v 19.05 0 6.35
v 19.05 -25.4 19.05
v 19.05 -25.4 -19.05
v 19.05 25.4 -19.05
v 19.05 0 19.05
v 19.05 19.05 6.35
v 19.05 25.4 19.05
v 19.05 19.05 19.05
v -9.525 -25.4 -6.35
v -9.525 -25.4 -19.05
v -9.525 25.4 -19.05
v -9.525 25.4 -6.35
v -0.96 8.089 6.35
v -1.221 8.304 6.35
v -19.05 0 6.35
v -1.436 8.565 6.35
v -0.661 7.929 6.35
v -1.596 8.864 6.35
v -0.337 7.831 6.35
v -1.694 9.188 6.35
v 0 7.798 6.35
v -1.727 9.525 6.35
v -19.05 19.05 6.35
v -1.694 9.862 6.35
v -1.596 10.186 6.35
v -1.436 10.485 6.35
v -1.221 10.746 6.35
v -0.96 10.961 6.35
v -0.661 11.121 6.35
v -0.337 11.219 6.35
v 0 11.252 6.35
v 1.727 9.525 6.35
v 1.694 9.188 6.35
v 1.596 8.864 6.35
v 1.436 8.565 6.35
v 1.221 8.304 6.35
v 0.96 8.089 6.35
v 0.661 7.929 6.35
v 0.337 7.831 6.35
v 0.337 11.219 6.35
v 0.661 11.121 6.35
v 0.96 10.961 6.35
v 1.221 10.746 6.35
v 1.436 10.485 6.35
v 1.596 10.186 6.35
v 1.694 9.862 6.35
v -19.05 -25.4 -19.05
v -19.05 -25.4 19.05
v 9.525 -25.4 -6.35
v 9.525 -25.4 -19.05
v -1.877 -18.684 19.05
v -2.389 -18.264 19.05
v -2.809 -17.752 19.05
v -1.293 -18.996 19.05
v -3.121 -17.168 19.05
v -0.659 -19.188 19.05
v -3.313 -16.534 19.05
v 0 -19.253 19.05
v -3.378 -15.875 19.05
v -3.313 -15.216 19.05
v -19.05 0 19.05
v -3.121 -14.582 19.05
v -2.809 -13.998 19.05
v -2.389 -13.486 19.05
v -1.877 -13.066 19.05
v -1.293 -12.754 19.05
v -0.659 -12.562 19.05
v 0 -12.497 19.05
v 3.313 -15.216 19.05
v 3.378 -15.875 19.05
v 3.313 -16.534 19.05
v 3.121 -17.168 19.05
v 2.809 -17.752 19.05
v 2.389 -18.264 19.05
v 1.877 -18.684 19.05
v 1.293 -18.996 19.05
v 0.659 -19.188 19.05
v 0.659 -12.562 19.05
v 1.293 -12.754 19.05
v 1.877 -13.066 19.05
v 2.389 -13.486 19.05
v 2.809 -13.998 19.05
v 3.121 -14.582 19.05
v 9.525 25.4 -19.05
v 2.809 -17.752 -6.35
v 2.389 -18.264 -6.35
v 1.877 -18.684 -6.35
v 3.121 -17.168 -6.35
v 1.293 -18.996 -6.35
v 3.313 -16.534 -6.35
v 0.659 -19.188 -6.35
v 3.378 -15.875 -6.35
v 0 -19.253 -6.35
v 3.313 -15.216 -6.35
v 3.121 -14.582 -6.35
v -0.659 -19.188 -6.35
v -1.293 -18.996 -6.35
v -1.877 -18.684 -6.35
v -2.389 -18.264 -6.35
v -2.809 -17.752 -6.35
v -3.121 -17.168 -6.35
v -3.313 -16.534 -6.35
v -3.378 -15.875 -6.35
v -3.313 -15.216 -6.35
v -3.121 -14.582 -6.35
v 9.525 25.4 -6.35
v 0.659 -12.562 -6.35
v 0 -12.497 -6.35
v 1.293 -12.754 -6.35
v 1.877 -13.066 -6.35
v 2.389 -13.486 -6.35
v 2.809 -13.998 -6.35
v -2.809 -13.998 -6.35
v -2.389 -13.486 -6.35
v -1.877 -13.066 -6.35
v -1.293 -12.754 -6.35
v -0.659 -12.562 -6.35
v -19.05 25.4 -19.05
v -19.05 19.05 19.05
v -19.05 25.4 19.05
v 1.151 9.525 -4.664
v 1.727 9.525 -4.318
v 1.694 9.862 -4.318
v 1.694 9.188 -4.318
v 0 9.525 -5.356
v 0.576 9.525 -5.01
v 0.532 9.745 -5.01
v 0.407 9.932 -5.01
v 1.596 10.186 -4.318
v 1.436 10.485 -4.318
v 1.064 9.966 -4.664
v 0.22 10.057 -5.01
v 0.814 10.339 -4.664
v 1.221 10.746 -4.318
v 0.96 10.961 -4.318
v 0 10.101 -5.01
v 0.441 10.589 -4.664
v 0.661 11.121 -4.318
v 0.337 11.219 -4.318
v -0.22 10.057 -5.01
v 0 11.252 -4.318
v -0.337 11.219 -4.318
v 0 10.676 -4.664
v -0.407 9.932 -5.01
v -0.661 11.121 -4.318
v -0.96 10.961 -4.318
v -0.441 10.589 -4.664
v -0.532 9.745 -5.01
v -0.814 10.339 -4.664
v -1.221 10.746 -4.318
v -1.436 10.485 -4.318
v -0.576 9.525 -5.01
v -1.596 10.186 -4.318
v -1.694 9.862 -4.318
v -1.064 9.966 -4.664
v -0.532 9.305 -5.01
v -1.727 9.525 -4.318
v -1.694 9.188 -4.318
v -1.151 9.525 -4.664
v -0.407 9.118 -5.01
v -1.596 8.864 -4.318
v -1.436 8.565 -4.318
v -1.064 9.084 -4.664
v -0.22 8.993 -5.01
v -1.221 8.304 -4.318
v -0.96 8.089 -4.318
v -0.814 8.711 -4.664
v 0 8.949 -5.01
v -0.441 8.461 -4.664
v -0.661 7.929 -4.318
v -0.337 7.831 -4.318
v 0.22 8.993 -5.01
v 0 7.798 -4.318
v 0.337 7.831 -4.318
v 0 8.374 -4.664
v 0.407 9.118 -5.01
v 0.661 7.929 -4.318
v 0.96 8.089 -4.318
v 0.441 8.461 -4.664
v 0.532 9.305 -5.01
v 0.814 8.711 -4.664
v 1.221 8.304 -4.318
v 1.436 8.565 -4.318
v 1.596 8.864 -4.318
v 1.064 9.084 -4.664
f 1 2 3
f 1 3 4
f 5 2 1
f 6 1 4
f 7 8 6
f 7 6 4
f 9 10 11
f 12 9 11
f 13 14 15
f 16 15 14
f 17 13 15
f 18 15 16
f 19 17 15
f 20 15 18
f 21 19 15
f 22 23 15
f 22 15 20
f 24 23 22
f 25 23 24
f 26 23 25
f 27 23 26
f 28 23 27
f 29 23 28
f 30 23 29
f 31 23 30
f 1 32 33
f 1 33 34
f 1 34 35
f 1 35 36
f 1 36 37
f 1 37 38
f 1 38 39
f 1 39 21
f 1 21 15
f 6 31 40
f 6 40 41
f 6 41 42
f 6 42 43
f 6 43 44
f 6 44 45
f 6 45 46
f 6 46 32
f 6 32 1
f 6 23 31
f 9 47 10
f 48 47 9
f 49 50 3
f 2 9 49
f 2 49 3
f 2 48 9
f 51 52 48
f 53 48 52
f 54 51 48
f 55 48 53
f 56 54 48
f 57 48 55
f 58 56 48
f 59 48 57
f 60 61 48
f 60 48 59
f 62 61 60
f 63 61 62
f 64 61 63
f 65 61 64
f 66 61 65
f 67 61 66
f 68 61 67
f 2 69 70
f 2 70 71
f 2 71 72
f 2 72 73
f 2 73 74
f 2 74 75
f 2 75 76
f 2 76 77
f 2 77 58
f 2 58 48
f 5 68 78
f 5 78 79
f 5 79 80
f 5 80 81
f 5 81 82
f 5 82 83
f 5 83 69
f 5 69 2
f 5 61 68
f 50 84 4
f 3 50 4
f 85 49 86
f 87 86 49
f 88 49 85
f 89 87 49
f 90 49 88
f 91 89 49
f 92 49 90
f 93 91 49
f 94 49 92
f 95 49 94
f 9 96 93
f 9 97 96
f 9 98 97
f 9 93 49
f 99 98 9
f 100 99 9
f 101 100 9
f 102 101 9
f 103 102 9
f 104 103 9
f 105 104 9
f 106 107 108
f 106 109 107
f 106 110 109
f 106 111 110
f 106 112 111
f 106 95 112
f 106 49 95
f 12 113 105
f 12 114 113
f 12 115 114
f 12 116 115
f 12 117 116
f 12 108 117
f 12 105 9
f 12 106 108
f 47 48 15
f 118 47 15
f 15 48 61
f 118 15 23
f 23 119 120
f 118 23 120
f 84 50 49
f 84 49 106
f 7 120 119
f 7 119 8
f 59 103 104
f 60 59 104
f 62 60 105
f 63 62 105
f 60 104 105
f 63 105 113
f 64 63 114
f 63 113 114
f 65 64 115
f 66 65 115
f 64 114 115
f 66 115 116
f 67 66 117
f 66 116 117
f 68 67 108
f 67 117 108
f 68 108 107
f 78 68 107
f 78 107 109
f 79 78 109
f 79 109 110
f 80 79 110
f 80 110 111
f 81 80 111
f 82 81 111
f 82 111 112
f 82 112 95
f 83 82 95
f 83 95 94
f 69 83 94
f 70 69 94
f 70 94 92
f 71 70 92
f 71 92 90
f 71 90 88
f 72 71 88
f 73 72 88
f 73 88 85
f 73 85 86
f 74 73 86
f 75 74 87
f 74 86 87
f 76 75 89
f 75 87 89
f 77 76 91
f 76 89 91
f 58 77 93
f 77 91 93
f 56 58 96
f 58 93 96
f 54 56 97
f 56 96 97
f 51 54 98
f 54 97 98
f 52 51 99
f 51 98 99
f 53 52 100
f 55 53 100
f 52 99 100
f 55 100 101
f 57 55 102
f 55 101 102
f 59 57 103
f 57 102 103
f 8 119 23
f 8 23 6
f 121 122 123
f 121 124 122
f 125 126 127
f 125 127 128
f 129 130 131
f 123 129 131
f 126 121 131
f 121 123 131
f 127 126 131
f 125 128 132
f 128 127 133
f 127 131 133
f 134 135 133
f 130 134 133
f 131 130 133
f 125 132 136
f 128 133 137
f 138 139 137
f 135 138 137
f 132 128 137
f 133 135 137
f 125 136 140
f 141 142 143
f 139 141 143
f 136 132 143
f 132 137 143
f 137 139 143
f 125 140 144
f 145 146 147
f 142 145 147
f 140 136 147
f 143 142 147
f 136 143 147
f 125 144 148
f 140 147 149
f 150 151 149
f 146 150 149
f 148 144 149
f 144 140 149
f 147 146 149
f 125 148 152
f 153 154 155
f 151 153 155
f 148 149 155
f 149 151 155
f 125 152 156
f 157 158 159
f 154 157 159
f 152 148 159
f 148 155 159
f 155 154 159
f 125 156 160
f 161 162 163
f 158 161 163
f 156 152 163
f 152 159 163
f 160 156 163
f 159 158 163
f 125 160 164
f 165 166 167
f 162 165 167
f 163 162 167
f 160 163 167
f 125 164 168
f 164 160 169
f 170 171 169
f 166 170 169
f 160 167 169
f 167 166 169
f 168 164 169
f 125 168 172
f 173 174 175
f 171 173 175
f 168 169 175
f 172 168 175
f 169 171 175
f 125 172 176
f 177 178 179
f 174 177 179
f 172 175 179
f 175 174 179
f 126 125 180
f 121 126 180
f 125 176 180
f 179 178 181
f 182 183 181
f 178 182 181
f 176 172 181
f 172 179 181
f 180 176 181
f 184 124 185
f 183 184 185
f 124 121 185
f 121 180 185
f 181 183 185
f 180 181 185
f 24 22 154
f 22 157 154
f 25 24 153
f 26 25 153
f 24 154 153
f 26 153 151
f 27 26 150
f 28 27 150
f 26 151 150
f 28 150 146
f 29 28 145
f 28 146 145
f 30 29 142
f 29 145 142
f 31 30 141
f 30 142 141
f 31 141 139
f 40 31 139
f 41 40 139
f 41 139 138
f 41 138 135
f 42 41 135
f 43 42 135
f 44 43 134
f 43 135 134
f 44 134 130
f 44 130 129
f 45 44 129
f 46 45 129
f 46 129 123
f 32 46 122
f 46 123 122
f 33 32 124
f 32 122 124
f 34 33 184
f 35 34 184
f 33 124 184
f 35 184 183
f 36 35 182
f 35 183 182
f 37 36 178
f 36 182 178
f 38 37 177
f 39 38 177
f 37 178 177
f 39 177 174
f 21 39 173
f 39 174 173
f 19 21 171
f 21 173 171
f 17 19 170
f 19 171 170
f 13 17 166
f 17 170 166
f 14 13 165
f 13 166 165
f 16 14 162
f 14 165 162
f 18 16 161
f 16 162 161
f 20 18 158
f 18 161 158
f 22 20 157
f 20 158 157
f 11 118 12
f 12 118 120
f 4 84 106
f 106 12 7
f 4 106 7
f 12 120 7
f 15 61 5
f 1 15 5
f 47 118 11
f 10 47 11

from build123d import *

# Parameters (mm, degrees)
SKETCH1_W                 = 38.1
SKETCH1_H                 = 50.8
BOSS_EXTRUDE1_DEPTH       = 19.05
SKETCH2_W                 = 19.05
SKETCH2_H                 = 50.8
CUT_EXTRUDE1_DEPTH        = 12.7
SKETCH3_W                 = 38.1
SKETCH3_H                 = 19.05
CUT_EXTRUDE2_DEPTH        = 12.7
F_1_4_CLEARANCE_HOLE1_D   = 6.7564
F_8_32_TAPPED_HOLE1_D     = 3.4544
F_8_32_TAPPED_HOLE1_DEPTH = 10.668
F_8_32_TAPPED_HOLE1_TIP   = 1.037806461


with BuildPart() as part:
    # Sketch1 → Boss-Extrude1 (new, symmetric)
    with BuildSketch(Plane.XY):
        Rectangle(SKETCH1_W, SKETCH1_H)
    extrude(amount=BOSS_EXTRUDE1_DEPTH, both=True)

    # Sketch2 → Cut-Extrude1 (cut)
    with BuildSketch(Plane(origin=(0, 0, -19.05), x_dir=(-1, 0, 0), z_dir=(0, 0, -1))):
        Rectangle(SKETCH2_W, SKETCH2_H)
    extrude(amount=-CUT_EXTRUDE1_DEPTH, mode=Mode.SUBTRACT)

    # Sketch3 → Cut-Extrude2 (cut)
    with BuildSketch(Plane.XY.offset(19.05)):
        with Locations((0, 9.525)):
            Rectangle(SKETCH3_W, SKETCH3_H)
    extrude(amount=-CUT_EXTRUDE2_DEPTH, mode=Mode.SUBTRACT)

    # 1/4 Clearance Hole1 (through all)
    with Locations(Plane.XY.offset(19.05)):
        with Locations((0, -15.875)):
            Hole(F_1_4_CLEARANCE_HOLE1_D / 2)

    # #8-32 Tapped Hole1
    with Locations(Plane.XY.offset(6.35)):
        with Locations((0, 9.525)):
            Hole(F_8_32_TAPPED_HOLE1_D / 2, depth=F_8_32_TAPPED_HOLE1_DEPTH)
            with Locations((0, 0, -(F_8_32_TAPPED_HOLE1_DEPTH + F_8_32_TAPPED_HOLE1_TIP / 2))):  # 118° drill point
                Cone(0, F_8_32_TAPPED_HOLE1_D / 2, F_8_32_TAPPED_HOLE1_TIP, mode=Mode.SUBTRACT)


solid = part.part
